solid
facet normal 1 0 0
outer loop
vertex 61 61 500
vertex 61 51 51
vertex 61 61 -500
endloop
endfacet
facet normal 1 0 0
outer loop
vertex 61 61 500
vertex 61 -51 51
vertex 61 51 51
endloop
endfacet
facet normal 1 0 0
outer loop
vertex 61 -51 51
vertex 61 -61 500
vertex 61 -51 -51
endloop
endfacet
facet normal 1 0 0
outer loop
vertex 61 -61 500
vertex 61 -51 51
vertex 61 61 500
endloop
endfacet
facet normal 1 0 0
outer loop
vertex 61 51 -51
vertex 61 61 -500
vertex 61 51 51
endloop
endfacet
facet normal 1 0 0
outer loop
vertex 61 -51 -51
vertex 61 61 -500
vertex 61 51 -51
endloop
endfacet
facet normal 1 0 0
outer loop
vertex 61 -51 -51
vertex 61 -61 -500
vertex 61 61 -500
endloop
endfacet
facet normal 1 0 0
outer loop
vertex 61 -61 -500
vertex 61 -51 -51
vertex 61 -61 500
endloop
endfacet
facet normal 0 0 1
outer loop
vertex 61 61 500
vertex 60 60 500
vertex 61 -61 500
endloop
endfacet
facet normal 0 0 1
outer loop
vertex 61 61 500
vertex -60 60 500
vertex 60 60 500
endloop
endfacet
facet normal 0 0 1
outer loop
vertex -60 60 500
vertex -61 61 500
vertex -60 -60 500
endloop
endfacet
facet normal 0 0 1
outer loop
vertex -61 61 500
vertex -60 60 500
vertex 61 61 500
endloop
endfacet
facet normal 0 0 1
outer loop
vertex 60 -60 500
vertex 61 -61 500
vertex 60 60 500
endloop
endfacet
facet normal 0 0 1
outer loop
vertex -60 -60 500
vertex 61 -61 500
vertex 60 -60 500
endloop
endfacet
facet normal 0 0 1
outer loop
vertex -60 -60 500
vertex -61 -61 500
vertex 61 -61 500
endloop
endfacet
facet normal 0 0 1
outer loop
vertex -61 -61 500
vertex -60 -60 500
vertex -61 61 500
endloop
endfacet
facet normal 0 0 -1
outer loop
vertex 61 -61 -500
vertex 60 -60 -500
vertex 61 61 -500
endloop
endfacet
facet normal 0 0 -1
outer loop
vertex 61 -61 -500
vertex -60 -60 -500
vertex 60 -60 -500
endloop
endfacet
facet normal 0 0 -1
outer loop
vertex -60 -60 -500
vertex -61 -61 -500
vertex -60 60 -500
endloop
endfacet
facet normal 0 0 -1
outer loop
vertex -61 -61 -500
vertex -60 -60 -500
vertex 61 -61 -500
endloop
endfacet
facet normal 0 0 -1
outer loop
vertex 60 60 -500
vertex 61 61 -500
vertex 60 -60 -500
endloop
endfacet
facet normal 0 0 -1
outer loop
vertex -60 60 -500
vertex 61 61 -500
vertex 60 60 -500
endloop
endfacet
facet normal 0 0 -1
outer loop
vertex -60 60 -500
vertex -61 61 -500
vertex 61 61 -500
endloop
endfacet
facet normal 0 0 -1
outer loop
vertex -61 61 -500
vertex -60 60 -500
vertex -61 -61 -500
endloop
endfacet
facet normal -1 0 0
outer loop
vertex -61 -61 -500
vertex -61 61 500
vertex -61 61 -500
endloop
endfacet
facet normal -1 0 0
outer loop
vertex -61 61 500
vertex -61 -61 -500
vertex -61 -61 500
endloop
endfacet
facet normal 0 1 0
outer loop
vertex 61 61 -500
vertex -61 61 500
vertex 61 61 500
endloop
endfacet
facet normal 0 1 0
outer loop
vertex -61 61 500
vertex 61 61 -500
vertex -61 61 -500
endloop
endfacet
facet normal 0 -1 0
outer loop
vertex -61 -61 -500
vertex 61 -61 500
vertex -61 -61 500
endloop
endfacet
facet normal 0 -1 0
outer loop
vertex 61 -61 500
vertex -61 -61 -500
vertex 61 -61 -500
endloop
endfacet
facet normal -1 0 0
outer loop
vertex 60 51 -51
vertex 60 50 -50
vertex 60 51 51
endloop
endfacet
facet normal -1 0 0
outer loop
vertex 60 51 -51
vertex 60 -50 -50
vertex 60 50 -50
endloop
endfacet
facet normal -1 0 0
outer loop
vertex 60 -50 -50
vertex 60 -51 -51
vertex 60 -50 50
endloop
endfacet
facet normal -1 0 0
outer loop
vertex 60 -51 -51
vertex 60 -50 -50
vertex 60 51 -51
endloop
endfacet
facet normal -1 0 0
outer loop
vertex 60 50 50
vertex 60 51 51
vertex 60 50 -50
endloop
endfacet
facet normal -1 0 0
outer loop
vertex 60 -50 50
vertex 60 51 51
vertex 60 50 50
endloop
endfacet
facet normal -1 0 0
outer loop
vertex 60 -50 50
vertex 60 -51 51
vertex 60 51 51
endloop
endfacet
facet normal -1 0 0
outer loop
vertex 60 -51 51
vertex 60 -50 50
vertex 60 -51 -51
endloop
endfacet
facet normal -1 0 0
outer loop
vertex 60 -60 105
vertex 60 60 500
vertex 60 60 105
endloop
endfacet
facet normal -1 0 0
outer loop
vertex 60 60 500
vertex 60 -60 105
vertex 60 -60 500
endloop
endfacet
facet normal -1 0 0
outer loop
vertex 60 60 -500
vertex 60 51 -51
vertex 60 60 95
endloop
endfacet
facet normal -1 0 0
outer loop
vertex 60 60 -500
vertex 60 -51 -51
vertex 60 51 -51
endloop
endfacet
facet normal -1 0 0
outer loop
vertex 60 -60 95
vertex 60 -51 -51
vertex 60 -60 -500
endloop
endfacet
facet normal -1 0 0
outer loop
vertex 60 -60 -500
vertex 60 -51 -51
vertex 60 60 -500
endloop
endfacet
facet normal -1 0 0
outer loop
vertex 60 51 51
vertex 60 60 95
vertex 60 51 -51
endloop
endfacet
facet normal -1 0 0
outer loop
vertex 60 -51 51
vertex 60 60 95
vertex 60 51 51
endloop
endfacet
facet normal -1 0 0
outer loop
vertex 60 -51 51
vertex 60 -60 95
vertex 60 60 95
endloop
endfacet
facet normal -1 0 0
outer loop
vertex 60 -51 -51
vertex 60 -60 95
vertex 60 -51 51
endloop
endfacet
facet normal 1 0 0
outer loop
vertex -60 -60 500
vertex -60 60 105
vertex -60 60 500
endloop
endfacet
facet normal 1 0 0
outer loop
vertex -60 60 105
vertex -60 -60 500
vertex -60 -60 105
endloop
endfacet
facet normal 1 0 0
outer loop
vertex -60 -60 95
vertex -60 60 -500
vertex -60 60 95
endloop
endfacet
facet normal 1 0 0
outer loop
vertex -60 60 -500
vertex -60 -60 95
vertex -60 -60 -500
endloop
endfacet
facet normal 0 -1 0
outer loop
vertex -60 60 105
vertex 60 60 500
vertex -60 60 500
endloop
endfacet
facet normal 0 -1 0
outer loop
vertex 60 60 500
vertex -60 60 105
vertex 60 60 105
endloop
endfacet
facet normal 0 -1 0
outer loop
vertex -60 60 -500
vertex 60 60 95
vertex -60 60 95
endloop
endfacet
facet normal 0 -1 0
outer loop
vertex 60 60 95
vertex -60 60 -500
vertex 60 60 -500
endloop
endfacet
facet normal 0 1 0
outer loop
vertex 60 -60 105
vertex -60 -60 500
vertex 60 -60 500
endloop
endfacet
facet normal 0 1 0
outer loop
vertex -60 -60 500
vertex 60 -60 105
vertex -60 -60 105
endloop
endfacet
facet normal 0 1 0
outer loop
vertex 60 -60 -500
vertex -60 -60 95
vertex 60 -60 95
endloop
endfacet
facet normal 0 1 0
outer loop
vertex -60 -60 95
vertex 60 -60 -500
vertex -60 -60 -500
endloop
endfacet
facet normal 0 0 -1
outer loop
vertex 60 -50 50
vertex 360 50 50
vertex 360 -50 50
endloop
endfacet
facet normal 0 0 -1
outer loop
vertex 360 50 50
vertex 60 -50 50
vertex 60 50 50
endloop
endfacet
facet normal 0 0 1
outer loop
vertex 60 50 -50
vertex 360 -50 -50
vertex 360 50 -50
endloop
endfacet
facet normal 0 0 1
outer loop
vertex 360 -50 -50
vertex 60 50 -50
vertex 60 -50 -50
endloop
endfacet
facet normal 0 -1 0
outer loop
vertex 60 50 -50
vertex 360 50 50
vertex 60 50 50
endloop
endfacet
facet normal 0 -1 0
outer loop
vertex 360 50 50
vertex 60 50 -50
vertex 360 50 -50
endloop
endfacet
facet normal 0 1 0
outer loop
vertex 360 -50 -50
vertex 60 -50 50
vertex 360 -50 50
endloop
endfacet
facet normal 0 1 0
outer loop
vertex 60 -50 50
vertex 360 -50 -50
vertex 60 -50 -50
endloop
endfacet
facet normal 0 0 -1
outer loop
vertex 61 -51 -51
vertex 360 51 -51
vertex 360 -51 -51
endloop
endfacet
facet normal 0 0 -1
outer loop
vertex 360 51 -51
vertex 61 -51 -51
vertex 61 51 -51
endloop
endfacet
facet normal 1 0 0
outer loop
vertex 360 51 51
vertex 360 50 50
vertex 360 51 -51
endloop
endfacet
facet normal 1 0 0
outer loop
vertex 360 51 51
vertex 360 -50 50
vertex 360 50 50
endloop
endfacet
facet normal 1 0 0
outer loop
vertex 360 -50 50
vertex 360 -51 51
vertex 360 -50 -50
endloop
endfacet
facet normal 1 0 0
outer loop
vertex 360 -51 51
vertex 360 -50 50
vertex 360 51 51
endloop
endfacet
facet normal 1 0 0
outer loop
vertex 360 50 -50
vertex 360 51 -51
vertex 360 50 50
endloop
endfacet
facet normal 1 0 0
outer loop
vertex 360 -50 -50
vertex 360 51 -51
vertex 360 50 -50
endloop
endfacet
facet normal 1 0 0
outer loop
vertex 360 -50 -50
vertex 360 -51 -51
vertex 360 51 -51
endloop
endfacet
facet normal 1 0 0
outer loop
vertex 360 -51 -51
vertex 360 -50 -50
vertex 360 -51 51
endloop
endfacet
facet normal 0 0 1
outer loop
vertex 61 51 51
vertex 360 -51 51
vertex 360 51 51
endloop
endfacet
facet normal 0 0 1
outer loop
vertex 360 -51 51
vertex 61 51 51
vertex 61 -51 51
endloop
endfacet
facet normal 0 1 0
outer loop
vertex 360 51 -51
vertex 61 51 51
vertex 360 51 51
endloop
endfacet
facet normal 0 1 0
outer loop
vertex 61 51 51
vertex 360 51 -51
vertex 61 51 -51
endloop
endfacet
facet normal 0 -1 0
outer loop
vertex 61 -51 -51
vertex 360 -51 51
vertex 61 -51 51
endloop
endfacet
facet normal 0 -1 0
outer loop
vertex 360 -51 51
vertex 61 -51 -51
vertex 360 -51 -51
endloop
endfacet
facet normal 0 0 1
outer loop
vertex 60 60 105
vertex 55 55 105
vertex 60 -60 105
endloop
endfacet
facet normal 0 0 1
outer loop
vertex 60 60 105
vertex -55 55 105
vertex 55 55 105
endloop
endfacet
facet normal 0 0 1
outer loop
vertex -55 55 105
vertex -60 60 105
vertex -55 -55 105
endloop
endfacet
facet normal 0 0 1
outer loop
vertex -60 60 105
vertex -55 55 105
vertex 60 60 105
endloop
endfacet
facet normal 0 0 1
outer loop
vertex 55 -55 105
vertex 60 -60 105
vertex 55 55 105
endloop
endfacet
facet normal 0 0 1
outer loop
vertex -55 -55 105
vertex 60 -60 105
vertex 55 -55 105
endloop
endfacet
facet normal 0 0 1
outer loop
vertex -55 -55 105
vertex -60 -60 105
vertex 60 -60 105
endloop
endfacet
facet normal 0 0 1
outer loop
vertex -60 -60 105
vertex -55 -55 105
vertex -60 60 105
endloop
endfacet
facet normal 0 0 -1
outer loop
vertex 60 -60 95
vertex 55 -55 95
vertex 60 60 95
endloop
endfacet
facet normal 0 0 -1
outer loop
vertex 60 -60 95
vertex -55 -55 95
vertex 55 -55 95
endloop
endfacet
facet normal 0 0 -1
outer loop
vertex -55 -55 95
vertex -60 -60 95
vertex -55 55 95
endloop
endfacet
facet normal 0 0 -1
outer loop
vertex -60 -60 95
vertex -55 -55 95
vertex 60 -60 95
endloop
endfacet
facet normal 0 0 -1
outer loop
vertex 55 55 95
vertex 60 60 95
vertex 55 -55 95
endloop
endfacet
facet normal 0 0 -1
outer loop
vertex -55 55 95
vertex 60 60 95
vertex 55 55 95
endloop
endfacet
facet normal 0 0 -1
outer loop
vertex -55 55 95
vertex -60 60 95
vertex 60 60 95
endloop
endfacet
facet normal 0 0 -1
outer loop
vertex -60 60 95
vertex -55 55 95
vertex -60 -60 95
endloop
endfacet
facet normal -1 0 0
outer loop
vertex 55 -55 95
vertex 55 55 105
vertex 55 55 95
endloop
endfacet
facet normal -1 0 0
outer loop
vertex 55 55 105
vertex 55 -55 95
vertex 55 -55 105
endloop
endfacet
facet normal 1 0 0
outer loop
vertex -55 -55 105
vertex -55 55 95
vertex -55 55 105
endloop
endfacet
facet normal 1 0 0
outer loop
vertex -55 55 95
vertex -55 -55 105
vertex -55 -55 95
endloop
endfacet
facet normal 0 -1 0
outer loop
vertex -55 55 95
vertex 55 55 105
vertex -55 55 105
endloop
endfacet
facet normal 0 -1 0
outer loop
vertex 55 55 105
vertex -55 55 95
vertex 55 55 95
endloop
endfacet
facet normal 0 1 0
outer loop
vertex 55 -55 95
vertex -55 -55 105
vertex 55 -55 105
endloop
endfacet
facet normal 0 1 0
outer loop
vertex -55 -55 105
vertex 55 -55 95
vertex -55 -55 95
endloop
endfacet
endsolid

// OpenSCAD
module guan (kuan,long) {
    difference() {
        cube(size=[kuan+2, kuan+2, long], center=true);
        cube(size=[kuan, kuan, long], center=true);
    }
}


module main () {
    union() {
        translate([0, 0, 0]) {
            difference () {
                guan (120,1000);
                translate([60, 0, 0]) {
                    cube(size=[2, 100, 100], center=true);
                } 
            }
            translate([210, 0, 0]) {
                rotate([0, 90, 0]) {
                    guan (100,300) ;
                }
            }
        }
        translate([0, 0, 100]) {
            difference() {
                cube(size=[120, 120, 10], center=true);
                cube(size=[110, 110, 10], center=true);
            }
        }
    }
}

main ();
